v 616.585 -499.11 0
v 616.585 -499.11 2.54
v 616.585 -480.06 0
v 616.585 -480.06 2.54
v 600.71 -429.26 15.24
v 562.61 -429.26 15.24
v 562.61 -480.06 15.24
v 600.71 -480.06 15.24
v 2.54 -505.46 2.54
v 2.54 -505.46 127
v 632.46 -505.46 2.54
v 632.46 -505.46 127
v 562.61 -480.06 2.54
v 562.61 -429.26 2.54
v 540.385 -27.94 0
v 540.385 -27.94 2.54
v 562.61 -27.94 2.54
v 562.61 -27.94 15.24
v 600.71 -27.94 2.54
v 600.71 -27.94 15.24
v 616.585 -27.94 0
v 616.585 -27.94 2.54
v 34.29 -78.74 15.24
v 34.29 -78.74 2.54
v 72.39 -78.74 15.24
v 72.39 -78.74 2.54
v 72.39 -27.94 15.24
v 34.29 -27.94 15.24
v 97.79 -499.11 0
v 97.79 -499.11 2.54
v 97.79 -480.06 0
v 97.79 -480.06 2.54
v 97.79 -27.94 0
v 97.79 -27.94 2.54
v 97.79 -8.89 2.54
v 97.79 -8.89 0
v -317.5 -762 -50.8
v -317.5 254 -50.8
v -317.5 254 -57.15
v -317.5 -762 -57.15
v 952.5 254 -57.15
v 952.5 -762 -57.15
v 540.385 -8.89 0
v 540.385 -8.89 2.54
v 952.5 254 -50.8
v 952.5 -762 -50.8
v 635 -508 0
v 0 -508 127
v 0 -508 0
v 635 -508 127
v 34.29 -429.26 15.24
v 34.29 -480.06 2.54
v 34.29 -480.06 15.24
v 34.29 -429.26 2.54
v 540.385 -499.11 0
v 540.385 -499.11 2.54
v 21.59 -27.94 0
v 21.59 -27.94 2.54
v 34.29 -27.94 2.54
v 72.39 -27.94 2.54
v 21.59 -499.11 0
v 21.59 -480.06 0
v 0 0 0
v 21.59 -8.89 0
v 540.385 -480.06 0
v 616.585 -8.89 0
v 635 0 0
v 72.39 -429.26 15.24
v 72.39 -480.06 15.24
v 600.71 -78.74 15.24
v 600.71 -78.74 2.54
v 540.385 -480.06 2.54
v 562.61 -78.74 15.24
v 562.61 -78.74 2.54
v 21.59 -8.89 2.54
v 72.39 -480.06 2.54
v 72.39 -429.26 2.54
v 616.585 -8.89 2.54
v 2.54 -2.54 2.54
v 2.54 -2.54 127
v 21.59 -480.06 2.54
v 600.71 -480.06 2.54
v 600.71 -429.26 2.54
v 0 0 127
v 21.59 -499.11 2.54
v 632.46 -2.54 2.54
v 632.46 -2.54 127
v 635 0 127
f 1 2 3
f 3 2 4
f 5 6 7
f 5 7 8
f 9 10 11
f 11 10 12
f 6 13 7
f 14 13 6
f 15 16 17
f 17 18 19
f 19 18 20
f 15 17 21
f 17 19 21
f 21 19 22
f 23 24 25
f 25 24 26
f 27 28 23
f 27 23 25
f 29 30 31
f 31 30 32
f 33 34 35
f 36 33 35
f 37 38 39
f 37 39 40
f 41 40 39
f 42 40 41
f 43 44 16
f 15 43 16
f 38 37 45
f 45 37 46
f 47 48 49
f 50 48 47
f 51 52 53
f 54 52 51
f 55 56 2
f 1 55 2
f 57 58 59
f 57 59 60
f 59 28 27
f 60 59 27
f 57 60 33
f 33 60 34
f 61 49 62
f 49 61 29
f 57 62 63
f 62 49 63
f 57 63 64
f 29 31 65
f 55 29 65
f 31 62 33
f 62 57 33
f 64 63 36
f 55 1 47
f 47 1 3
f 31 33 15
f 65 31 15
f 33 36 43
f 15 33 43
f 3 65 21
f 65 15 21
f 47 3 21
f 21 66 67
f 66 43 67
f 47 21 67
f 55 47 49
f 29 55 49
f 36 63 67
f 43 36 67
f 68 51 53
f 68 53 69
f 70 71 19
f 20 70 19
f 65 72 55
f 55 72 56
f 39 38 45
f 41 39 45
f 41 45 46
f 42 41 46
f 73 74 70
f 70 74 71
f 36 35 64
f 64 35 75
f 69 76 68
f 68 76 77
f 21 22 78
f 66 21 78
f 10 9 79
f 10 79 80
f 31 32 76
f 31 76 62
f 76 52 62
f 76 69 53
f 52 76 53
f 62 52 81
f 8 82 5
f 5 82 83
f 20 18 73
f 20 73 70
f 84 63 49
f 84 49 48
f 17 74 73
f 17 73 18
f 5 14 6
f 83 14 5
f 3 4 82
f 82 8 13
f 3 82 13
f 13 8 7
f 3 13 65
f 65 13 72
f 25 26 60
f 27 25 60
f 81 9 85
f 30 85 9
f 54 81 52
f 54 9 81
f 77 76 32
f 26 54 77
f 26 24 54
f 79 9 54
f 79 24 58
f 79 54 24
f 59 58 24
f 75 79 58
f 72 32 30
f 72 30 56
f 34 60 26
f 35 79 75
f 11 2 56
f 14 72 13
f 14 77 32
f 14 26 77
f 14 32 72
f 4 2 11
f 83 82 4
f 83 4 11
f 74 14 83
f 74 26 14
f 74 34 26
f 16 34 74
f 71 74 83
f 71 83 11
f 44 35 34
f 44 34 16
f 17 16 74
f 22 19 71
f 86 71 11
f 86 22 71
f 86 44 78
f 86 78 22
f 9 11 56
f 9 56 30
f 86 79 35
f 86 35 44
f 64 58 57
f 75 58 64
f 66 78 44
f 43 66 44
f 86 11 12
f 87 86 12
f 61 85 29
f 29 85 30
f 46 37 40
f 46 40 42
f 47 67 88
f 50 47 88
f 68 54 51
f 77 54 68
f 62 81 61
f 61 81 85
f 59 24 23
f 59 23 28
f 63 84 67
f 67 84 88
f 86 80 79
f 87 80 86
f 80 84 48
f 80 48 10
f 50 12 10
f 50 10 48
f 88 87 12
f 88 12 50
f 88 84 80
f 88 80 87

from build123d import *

# Parameters (mm, degrees)
F0_W     = 635
F0_H     = 127
F1_DEPTH = 508
F2_T     = -2.54
F3_W     = 38.1
F3_H     = 50.8
F4_DEPTH = 12.7
F3_W_2   = 12.7
F3_H_2   = 19.05
F5_DEPTH = 25.4
F7_W     = 1270
F7_H     = 1016
F8_DEPTH = 6.35


with BuildPart() as f1:
    # F0 (on Front) → F1 (new body)
    with BuildSketch(Plane.XZ):
        with Locations((317.5, 63.5)):
            Rectangle(F0_W, F0_H)
    extrude(amount=F1_DEPTH)

    # F2
    f2_openings = [f1.faces().sort_by_distance(p)[0] for p in [
        (317.5, -254, 127),
    ]]
    offset(amount=F2_T, openings=f2_openings)

    # F3 (on face) → F4 (join)
    with BuildSketch(Plane.XY.offset(2.54)):
        with Locations((53.34, -53.34)):
            Rectangle(F3_W, F3_H)
        with Locations((581.66, -53.34)):
            Rectangle(F3_W, F3_H)
        with Locations((581.66, -454.66)):
            Rectangle(F3_W, F3_H)
        with Locations((53.34, -454.66)):
            Rectangle(F3_W, F3_H)
    extrude(amount=F4_DEPTH)

    # F3 (on face) → F5 (cut)
    with BuildSketch(Plane.XY.offset(2.54)):
        Polygon((72.39, -480.06), (34.29, -480.06), (21.59, -480.06), (21.59, -499.11), (97.79, -499.11), (97.79, -480.06), align=None)
        Polygon((34.29, -8.89), (34.29, -27.94), (72.39, -27.94), (97.79, -27.94), (97.79, -8.89), align=None)
        with Locations((27.94, -18.415)):
            Rectangle(F3_W_2, F3_H_2)
        Polygon((600.71, -27.94), (616.585, -27.94), (616.585, -8.89), (540.385, -8.89), (540.385, -27.94), (562.61, -27.94), align=None)
        Polygon((600.71, -480.06), (562.61, -480.06), (540.385, -480.06), (540.385, -499.11), (616.585, -499.11), (616.585, -480.06), align=None)
    extrude(amount=-F5_DEPTH, mode=Mode.SUBTRACT)


with BuildPart() as f8:
    # F7 (on offset) → F8 (new body)
    with BuildSketch(Plane(origin=(0, 0, -50.8), x_dir=(1, 0, 0), z_dir=(0, 0, -1))):
        with Locations((317.5, 254)):
            Rectangle(F7_W, F7_H)
    extrude(amount=F8_DEPTH)


solid = Compound([f1.part, f8.part])
